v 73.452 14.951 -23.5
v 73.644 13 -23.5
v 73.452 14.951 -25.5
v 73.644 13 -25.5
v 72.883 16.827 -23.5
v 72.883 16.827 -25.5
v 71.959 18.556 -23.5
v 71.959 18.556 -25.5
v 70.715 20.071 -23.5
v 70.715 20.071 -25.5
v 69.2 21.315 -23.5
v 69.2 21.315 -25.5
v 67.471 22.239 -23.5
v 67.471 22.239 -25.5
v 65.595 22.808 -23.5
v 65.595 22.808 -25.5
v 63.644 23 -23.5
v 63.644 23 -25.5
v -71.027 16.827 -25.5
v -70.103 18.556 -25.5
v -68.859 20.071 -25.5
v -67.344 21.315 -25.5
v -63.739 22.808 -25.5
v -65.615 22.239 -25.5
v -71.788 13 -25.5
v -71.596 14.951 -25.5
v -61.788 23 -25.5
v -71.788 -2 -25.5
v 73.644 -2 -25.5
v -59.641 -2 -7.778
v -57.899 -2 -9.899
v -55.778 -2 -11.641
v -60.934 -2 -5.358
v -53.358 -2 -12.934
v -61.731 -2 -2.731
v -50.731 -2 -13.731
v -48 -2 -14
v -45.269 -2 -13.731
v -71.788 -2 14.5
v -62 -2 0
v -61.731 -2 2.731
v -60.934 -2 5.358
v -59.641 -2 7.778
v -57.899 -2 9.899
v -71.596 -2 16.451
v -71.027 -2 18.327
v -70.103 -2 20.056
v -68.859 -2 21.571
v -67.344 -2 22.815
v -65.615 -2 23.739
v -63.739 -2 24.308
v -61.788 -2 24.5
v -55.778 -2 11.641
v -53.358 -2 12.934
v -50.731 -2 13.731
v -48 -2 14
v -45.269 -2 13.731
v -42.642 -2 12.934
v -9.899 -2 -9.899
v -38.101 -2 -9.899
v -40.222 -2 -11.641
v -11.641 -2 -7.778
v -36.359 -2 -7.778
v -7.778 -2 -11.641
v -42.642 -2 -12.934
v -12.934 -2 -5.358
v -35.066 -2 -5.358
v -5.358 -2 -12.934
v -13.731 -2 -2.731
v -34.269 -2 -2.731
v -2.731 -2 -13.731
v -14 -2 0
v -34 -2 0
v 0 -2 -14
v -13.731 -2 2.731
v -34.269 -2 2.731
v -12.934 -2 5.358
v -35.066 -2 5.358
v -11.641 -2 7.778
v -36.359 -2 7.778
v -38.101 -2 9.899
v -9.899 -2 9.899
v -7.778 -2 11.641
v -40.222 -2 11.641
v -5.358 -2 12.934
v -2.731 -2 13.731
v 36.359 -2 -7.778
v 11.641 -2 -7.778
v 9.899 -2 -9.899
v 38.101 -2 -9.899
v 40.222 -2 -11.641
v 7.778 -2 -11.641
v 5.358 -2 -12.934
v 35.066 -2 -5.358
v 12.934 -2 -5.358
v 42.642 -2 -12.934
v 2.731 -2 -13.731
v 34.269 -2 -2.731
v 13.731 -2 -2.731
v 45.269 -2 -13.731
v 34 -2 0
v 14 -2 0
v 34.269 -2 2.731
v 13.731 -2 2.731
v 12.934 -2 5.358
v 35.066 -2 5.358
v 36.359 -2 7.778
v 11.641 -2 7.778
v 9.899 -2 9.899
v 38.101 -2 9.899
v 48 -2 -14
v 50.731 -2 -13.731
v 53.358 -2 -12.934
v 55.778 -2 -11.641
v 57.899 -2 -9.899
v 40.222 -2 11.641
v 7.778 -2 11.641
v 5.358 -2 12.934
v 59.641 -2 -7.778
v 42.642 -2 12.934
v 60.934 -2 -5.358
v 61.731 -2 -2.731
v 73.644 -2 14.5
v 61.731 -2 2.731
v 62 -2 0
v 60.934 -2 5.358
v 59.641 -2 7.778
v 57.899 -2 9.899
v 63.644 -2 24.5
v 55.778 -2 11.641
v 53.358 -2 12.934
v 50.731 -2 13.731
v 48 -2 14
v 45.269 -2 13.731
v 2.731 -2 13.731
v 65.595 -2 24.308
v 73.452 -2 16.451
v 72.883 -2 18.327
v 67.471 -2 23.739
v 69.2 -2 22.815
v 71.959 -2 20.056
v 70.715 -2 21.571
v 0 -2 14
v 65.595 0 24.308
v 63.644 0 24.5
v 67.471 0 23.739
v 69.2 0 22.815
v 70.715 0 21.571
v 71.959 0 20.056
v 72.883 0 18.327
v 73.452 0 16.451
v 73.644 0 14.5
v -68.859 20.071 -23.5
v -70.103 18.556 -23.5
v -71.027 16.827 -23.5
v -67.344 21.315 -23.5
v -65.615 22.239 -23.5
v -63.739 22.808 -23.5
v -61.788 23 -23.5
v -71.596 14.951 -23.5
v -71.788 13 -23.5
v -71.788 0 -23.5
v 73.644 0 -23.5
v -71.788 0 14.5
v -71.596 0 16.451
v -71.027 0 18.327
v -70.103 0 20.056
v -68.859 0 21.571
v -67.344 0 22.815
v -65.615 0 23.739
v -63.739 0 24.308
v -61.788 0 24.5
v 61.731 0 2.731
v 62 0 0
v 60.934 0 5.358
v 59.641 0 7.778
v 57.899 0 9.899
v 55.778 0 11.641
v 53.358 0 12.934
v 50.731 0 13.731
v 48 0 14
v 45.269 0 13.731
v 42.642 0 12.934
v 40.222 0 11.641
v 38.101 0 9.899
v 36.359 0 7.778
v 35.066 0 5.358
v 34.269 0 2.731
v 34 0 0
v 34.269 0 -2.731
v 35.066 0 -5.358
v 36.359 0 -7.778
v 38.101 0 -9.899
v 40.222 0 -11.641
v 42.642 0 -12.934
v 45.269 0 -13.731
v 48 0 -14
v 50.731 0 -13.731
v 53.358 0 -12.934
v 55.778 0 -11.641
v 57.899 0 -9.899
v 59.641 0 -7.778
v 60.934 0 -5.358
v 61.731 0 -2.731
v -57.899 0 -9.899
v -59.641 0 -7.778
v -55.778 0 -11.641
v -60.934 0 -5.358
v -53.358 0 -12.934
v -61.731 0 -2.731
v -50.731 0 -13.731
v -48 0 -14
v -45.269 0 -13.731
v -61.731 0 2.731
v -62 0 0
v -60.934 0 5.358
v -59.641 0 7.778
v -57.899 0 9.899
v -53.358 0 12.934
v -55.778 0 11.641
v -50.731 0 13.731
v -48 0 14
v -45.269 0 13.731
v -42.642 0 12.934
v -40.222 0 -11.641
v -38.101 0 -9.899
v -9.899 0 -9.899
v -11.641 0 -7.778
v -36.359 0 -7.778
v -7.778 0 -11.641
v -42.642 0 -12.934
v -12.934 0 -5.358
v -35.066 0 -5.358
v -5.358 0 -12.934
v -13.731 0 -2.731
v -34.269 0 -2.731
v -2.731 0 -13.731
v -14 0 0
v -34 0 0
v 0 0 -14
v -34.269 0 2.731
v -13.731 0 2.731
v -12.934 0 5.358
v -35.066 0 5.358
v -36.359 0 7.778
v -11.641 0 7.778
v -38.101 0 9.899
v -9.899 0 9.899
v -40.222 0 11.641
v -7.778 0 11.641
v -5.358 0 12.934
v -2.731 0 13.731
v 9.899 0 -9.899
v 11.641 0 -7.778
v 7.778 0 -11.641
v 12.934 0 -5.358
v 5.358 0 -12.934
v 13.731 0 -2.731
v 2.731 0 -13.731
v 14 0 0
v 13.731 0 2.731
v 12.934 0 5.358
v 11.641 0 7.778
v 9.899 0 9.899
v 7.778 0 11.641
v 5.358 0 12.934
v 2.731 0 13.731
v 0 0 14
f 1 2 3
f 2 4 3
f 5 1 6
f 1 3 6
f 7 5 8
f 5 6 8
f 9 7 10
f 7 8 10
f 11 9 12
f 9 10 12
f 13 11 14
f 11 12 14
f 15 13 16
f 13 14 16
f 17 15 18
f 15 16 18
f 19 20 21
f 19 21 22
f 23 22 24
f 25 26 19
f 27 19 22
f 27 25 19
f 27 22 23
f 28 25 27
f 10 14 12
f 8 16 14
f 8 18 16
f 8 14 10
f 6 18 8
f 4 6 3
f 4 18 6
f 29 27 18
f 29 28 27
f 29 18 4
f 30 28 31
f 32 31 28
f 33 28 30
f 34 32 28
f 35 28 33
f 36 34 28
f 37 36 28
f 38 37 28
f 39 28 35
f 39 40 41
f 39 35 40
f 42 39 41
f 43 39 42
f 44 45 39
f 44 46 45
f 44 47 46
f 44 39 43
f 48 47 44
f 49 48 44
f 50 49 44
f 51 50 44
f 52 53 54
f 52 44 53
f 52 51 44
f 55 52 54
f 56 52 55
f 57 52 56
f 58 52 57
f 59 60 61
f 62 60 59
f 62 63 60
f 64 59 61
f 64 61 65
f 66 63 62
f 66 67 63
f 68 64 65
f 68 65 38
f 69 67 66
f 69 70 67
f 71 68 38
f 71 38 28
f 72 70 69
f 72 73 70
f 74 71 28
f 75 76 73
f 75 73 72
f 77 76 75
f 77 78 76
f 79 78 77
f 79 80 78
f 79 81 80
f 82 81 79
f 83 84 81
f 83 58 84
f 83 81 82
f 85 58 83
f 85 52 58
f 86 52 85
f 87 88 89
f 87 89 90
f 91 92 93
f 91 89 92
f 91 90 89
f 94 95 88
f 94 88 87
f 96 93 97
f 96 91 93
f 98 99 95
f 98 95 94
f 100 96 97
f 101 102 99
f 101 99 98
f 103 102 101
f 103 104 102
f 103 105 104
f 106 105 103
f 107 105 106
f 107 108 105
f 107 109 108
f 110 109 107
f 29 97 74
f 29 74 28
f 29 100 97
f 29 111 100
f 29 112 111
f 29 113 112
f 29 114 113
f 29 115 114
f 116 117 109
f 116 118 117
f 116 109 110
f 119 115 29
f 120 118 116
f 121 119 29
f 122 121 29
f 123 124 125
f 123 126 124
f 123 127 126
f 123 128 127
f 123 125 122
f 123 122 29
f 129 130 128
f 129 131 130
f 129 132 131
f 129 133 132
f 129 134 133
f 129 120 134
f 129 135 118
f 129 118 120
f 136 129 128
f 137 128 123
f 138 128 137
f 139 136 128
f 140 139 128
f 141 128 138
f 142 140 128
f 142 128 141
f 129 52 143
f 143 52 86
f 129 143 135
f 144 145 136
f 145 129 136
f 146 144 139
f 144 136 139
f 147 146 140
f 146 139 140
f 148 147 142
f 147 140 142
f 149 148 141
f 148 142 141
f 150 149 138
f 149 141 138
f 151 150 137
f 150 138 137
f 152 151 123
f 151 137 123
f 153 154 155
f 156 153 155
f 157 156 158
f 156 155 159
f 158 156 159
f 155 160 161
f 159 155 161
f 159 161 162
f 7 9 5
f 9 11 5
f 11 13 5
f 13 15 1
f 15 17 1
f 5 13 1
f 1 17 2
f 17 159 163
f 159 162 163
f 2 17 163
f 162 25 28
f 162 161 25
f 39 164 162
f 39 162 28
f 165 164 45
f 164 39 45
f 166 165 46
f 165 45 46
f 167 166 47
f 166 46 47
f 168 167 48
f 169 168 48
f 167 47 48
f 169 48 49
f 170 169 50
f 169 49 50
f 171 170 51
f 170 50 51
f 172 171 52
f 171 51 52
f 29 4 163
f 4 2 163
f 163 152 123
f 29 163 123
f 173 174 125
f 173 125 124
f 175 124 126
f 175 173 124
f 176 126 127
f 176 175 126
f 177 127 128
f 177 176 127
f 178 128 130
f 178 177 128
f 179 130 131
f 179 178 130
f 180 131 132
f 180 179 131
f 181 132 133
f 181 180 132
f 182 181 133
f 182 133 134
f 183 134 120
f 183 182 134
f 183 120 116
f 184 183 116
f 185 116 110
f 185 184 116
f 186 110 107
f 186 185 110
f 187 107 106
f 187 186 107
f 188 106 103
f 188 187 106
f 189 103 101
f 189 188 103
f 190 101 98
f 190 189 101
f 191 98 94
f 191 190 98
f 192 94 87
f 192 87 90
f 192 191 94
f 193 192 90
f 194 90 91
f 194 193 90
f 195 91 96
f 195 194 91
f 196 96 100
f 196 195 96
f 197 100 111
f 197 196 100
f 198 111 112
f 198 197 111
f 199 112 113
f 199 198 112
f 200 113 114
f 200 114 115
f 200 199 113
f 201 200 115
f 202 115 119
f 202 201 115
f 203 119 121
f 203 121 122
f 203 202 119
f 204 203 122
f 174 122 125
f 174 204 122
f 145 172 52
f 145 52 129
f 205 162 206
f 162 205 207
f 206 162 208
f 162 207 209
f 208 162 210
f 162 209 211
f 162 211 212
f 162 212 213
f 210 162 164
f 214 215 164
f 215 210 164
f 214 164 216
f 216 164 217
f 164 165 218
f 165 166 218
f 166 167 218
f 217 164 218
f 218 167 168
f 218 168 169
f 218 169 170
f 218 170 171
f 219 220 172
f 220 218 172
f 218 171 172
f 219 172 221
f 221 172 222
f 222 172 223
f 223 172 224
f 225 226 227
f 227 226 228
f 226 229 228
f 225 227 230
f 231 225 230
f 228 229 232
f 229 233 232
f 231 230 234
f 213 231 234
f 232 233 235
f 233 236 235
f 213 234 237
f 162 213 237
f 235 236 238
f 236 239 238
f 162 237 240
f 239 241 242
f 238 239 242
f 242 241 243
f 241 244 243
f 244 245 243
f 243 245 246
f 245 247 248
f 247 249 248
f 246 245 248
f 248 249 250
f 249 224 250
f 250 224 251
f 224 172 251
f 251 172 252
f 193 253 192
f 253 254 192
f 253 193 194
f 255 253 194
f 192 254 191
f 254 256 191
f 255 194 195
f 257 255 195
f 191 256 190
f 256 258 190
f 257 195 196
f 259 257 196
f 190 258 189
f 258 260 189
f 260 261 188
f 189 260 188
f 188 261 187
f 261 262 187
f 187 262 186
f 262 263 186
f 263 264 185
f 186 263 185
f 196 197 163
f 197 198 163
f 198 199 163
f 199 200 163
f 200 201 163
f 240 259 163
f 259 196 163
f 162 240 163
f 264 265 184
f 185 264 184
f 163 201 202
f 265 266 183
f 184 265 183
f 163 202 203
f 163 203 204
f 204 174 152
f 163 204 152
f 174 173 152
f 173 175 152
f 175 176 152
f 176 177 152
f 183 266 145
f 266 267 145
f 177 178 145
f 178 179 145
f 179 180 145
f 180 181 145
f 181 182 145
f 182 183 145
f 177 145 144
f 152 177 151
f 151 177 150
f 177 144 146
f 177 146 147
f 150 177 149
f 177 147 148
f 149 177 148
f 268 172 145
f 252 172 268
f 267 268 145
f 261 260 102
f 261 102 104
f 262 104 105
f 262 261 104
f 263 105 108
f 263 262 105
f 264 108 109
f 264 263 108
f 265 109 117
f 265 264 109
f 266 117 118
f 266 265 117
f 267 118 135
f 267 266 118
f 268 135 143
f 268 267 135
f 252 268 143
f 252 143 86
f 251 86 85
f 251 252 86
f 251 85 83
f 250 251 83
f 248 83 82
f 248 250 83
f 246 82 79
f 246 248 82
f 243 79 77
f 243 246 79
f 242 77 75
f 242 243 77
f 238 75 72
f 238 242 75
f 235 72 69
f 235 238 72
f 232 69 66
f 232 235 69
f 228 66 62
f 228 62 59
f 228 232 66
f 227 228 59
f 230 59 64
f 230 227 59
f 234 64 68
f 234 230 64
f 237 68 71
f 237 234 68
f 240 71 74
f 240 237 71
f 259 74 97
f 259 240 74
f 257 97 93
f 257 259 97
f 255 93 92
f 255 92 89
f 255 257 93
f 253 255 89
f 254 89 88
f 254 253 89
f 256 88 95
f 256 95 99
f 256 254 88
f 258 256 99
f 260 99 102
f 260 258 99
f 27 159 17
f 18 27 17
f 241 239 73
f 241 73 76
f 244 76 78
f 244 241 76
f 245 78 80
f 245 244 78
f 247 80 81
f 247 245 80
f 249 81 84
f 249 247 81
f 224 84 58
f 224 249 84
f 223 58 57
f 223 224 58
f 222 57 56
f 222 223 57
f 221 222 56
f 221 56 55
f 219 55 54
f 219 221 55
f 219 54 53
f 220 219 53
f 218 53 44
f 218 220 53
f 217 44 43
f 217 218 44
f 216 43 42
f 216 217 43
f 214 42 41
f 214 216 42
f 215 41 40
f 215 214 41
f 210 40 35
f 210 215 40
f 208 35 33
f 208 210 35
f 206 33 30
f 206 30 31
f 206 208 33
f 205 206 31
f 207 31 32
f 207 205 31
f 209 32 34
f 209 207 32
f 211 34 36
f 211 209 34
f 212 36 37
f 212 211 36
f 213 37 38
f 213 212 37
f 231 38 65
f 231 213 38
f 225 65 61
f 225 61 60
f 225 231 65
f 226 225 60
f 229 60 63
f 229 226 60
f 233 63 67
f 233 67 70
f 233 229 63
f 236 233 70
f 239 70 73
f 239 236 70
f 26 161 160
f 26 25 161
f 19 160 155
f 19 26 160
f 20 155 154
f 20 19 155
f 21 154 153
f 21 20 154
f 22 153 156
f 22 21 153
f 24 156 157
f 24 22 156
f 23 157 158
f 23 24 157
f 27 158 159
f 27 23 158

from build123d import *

# Parameters (mm, degrees)
F0_W     = 145.4322189093
F0_H     = 48
F0_R     = 14
F1_DEPTH = 2
F3_R     = 10
F4_W     = 145.4322189093
F4_H     = 25
F5_DEPTH = 2
F6_R     = 10


with BuildPart() as f1:
    # F0 (on Front) → F1 (new body)
    with BuildSketch(Plane.XZ):
        with Locations((0.9282901883, 0.5)):
            Rectangle(F0_W, F0_H)
        with Locations((-48, 0)):
            Circle(F0_R, mode=Mode.SUBTRACT)
        Circle(F0_R, mode=Mode.SUBTRACT)
        with Locations((48, 0)):
            Circle(F0_R, mode=Mode.SUBTRACT)
    extrude(amount=F1_DEPTH)

    # F3
    f3_edges = [f1.edges().sort_by_distance(p)[0] for p in [
        (73.6444, -1, 24.5),
        (-71.787819, -1, 24.5),
    ]]
    fillet(f3_edges, radius=F3_R)

    # F4 (on offset) → F5 (join)
    with BuildSketch(Plane(origin=(0, 0, -23.5), x_dir=(1, 0, 0), z_dir=(0, 0, -1))):
        with Locations((0.9282901883, -10.5)):
            Rectangle(F4_W, F4_H)
    extrude(amount=F5_DEPTH)

    # F6
    f6_edges = [f1.edges().sort_by_distance(p)[0] for p in [
        (-71.787819, 23, -24.5),
        (73.6444, 23, -24.5),
    ]]
    fillet(f6_edges, radius=F6_R)


solid = f1.part
